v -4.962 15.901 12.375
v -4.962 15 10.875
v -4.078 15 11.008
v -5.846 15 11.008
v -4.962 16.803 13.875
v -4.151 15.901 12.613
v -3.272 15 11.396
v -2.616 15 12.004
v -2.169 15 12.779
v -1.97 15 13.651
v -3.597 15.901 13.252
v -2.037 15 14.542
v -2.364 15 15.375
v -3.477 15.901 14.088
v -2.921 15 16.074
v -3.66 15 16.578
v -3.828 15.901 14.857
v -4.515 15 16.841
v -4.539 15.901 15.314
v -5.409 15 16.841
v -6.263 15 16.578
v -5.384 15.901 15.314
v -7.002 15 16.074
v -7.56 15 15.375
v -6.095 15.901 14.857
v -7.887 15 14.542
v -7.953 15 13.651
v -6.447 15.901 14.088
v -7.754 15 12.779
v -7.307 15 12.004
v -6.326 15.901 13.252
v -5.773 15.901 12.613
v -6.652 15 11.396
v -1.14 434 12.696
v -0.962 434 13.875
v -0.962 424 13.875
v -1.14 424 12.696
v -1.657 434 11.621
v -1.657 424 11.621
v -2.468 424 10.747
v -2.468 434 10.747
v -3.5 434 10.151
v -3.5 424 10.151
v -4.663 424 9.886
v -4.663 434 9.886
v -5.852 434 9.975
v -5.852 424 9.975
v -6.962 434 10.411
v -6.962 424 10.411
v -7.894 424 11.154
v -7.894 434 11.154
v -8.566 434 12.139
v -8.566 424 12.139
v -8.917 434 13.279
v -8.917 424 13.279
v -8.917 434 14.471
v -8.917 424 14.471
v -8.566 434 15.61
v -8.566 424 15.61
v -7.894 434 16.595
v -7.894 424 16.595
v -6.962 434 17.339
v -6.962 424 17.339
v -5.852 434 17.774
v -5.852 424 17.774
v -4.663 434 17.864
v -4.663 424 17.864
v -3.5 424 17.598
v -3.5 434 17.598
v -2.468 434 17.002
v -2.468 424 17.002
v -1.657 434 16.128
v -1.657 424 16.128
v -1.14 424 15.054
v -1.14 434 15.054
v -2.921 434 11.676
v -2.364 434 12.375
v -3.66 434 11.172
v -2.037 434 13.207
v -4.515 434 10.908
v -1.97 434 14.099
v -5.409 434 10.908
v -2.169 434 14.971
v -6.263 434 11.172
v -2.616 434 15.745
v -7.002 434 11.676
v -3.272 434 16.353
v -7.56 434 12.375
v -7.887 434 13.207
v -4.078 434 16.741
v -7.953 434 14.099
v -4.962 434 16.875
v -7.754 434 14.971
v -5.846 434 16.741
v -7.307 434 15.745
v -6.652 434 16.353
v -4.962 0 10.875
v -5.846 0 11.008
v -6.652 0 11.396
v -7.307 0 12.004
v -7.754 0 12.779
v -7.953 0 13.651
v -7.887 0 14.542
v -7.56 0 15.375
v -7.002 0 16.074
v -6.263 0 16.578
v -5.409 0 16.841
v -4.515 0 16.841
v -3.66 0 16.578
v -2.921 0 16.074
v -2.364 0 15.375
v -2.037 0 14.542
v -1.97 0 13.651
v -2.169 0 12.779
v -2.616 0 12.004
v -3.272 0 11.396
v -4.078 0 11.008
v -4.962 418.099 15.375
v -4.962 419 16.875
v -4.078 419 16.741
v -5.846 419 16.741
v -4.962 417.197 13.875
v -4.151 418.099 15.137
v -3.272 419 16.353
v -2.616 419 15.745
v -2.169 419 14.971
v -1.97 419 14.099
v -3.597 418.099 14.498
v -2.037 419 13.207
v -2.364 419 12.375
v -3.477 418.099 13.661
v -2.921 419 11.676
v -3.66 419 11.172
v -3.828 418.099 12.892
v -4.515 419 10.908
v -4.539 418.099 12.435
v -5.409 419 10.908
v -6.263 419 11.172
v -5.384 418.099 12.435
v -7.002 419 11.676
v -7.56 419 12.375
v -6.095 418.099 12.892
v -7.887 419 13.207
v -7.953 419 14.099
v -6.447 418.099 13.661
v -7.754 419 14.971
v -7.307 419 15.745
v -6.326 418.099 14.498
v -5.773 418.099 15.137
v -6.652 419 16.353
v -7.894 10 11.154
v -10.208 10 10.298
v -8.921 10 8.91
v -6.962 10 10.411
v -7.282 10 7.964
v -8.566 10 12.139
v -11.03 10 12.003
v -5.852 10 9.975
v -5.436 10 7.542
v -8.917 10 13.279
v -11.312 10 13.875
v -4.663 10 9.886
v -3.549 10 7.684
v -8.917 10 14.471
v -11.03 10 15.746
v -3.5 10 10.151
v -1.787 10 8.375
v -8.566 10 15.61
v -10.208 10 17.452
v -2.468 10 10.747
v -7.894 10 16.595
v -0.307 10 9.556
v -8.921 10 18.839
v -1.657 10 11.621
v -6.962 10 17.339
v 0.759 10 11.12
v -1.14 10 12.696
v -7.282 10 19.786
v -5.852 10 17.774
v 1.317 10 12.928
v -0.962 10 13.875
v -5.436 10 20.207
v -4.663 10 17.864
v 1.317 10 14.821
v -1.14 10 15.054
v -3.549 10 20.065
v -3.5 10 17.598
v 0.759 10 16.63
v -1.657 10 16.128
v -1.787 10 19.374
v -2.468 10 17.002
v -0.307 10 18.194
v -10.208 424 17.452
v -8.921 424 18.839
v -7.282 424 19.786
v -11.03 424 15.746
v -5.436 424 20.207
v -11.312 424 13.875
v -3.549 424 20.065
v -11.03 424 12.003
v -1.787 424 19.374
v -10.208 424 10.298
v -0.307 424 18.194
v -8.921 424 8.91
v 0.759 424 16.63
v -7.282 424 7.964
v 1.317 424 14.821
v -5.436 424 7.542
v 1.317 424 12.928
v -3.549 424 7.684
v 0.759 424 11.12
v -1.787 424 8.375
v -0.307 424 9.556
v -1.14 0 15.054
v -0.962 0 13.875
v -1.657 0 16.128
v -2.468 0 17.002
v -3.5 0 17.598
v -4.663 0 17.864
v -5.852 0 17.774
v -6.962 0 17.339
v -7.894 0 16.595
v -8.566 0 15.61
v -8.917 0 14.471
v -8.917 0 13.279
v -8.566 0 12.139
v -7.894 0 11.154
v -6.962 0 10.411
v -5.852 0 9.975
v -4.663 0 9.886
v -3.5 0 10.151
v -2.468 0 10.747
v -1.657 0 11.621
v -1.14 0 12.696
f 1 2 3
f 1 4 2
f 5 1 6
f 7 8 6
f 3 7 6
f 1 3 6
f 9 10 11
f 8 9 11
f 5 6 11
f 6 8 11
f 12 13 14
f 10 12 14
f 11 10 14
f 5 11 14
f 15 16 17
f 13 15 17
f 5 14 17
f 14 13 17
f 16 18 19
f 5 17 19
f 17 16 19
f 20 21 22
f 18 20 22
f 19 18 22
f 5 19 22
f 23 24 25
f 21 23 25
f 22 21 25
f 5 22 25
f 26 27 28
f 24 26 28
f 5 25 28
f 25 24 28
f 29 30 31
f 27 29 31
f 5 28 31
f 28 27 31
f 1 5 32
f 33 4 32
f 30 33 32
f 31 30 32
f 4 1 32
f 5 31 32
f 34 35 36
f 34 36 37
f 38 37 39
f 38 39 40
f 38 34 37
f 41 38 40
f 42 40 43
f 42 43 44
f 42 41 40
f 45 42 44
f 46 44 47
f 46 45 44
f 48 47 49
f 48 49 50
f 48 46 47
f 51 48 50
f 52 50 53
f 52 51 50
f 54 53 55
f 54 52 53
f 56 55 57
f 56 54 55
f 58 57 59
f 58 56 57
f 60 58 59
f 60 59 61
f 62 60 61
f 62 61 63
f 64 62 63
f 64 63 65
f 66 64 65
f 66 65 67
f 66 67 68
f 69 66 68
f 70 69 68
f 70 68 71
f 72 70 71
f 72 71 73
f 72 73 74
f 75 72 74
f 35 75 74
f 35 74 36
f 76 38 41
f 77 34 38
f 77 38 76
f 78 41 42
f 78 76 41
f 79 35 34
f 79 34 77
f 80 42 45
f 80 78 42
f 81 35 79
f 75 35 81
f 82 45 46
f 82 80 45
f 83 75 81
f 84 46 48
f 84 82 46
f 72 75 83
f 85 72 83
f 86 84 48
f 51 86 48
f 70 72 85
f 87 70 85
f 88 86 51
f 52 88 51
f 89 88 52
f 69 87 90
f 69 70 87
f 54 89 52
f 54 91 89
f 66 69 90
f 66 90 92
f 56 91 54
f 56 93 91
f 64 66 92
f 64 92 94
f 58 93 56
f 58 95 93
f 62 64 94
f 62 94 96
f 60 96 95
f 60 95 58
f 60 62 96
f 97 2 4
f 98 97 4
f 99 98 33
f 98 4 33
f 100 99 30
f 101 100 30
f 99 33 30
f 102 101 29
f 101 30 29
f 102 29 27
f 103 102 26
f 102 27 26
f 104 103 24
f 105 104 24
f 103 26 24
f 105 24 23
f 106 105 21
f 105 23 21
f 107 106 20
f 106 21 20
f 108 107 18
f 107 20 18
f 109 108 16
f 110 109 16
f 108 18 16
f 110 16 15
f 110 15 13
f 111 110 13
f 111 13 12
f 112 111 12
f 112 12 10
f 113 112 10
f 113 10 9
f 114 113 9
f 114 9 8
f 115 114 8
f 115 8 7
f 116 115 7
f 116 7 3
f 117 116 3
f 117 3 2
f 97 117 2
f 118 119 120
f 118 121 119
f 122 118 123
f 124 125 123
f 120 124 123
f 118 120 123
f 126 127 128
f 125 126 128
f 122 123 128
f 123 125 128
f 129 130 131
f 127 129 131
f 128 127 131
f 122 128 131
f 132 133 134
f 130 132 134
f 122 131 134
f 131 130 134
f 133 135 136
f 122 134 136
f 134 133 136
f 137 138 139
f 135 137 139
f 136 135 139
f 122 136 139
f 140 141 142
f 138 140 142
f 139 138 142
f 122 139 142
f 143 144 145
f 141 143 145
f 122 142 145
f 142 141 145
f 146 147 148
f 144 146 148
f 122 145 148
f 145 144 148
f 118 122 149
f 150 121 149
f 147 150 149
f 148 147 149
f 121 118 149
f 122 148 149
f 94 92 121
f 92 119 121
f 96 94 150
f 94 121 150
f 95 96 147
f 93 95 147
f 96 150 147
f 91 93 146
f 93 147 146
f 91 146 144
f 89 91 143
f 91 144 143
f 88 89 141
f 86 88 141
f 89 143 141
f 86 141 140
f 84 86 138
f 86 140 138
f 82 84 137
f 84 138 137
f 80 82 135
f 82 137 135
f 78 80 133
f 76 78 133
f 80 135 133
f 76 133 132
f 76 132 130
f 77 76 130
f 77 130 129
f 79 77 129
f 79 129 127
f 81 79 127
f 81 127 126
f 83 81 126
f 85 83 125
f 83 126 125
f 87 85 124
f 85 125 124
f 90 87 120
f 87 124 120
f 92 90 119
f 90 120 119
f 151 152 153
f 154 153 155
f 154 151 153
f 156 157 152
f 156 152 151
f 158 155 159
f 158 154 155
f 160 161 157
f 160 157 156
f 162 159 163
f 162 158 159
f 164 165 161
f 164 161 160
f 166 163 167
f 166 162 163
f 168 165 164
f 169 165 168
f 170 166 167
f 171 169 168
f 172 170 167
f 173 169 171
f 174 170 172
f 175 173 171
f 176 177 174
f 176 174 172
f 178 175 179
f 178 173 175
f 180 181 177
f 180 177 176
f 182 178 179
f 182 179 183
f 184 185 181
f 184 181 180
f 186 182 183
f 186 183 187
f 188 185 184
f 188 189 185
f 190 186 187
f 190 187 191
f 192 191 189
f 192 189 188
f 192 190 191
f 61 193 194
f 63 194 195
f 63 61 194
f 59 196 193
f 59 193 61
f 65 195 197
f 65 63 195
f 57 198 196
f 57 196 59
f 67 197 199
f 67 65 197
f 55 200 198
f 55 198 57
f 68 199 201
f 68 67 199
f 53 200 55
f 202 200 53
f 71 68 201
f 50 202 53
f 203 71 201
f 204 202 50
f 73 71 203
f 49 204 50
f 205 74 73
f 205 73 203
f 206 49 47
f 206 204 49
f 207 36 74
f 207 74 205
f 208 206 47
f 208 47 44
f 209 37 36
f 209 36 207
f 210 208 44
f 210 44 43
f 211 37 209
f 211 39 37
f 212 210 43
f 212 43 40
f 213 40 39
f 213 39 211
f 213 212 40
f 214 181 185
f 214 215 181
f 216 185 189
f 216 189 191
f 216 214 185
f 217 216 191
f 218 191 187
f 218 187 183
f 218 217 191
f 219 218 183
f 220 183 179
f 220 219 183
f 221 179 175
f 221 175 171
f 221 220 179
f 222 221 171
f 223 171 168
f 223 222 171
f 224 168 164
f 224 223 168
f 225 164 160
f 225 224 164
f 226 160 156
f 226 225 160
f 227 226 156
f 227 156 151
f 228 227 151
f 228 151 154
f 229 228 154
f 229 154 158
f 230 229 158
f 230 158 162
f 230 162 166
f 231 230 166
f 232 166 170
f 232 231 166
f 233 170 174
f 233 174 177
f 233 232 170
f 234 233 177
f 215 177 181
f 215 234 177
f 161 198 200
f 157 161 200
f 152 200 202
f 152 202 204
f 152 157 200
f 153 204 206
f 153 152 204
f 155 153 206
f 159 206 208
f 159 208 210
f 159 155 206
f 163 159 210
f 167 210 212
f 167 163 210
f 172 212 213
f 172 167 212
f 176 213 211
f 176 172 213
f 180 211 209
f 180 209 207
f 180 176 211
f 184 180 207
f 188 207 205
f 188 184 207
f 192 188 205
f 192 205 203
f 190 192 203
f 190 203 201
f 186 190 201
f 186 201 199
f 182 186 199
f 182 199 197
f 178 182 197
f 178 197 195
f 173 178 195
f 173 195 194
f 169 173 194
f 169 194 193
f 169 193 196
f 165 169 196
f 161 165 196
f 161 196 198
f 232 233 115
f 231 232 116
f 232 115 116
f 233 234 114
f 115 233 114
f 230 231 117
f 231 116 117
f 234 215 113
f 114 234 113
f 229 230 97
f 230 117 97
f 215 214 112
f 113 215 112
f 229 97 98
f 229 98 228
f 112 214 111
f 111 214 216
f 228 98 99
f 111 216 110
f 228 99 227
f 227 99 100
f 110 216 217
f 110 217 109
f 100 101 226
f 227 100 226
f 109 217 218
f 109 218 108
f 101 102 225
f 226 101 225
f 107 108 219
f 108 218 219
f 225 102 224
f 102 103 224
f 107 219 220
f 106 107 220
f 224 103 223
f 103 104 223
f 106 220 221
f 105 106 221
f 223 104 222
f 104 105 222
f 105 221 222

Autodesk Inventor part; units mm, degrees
ref_plane "YZ Plane" through (0, 0, 0) normal (1, 0, 0) x (0, 1, 0)
ref_plane "XZ Plane" through (0, 0, 0) normal (0, 1, 0) x (-1, 0, 0)
ref_plane "XY Plane" through (0, 0, 0) normal (0, 0, 1) x (1, 0, 0)
sketch "Boceto1" plane through (0, 0, 0) normal (0, 1, 0) x (-1, 0, 0)
  circle A0 centre (4.9618, 13.8747) radius 6.35
  dimension "d0" = 12.7
extrude "Extrusión1" add sketch "Boceto1" along normal blind 434
sketch "Boceto2" plane through (-4.9618, 434, 13.8747) normal (0, 1, 0) x (1, 0, 0)
  circle A0 centre (0, 0) radius 3
  point P0 (4.9618, 13.8747)
  dimension "d3" = 6
hole "Agujero1" at (-4.9618, 434, 13.8747) direction (0, -1, 0) diameter 6 depth 15 tip angle 118
sketch "Boceto3" plane through (-4.9618, 0, 13.8747) normal (0, -1, 0) x (1, 0, 0)
  circle A0 centre (0, 0) radius 3
  point P0 (4.9618, -13.8747)
  dimension "d11" = 6
hole "Agujero2" at (-4.9618, 0, 13.8747) direction (0, 1, 0) diameter 6 depth 15 tip angle 118
thread "Thread1" size "M6x1" class "6H" standard "ANSI Metric M Profile" length 40
thread "Thread2" size "M6x1" class "6H" standard "ANSI Metric M Profile" length 40
sketch "Boceto4" plane through (-4.9618, 434, 13.8747) normal (0, 1, 0) x (1, 0, 0)
  circle A0 centre (0, 0) radius 4
  circle A1 centre (0, 0) radius 7
  dimension "d23" = 8
  dimension "d30" = 14
sketch "Boceto5" plane through (-4.9618, 0, 13.8747) normal (0, -1, 0) x (1, 0, 0)
  circle A0 centre (0, 0) radius 4
  circle A1 centre (0, 0) radius 6.5
  dimension "d24" = 8
  dimension "d29" = 13
extrude "Extrusión2" cut sketch "Boceto5" against normal blind 10
extrude "Extrusión3" cut sketch "Boceto4" against normal blind 10
properties part number "Guias de mesa" material "Steel, High Strength, Low Alloy"
